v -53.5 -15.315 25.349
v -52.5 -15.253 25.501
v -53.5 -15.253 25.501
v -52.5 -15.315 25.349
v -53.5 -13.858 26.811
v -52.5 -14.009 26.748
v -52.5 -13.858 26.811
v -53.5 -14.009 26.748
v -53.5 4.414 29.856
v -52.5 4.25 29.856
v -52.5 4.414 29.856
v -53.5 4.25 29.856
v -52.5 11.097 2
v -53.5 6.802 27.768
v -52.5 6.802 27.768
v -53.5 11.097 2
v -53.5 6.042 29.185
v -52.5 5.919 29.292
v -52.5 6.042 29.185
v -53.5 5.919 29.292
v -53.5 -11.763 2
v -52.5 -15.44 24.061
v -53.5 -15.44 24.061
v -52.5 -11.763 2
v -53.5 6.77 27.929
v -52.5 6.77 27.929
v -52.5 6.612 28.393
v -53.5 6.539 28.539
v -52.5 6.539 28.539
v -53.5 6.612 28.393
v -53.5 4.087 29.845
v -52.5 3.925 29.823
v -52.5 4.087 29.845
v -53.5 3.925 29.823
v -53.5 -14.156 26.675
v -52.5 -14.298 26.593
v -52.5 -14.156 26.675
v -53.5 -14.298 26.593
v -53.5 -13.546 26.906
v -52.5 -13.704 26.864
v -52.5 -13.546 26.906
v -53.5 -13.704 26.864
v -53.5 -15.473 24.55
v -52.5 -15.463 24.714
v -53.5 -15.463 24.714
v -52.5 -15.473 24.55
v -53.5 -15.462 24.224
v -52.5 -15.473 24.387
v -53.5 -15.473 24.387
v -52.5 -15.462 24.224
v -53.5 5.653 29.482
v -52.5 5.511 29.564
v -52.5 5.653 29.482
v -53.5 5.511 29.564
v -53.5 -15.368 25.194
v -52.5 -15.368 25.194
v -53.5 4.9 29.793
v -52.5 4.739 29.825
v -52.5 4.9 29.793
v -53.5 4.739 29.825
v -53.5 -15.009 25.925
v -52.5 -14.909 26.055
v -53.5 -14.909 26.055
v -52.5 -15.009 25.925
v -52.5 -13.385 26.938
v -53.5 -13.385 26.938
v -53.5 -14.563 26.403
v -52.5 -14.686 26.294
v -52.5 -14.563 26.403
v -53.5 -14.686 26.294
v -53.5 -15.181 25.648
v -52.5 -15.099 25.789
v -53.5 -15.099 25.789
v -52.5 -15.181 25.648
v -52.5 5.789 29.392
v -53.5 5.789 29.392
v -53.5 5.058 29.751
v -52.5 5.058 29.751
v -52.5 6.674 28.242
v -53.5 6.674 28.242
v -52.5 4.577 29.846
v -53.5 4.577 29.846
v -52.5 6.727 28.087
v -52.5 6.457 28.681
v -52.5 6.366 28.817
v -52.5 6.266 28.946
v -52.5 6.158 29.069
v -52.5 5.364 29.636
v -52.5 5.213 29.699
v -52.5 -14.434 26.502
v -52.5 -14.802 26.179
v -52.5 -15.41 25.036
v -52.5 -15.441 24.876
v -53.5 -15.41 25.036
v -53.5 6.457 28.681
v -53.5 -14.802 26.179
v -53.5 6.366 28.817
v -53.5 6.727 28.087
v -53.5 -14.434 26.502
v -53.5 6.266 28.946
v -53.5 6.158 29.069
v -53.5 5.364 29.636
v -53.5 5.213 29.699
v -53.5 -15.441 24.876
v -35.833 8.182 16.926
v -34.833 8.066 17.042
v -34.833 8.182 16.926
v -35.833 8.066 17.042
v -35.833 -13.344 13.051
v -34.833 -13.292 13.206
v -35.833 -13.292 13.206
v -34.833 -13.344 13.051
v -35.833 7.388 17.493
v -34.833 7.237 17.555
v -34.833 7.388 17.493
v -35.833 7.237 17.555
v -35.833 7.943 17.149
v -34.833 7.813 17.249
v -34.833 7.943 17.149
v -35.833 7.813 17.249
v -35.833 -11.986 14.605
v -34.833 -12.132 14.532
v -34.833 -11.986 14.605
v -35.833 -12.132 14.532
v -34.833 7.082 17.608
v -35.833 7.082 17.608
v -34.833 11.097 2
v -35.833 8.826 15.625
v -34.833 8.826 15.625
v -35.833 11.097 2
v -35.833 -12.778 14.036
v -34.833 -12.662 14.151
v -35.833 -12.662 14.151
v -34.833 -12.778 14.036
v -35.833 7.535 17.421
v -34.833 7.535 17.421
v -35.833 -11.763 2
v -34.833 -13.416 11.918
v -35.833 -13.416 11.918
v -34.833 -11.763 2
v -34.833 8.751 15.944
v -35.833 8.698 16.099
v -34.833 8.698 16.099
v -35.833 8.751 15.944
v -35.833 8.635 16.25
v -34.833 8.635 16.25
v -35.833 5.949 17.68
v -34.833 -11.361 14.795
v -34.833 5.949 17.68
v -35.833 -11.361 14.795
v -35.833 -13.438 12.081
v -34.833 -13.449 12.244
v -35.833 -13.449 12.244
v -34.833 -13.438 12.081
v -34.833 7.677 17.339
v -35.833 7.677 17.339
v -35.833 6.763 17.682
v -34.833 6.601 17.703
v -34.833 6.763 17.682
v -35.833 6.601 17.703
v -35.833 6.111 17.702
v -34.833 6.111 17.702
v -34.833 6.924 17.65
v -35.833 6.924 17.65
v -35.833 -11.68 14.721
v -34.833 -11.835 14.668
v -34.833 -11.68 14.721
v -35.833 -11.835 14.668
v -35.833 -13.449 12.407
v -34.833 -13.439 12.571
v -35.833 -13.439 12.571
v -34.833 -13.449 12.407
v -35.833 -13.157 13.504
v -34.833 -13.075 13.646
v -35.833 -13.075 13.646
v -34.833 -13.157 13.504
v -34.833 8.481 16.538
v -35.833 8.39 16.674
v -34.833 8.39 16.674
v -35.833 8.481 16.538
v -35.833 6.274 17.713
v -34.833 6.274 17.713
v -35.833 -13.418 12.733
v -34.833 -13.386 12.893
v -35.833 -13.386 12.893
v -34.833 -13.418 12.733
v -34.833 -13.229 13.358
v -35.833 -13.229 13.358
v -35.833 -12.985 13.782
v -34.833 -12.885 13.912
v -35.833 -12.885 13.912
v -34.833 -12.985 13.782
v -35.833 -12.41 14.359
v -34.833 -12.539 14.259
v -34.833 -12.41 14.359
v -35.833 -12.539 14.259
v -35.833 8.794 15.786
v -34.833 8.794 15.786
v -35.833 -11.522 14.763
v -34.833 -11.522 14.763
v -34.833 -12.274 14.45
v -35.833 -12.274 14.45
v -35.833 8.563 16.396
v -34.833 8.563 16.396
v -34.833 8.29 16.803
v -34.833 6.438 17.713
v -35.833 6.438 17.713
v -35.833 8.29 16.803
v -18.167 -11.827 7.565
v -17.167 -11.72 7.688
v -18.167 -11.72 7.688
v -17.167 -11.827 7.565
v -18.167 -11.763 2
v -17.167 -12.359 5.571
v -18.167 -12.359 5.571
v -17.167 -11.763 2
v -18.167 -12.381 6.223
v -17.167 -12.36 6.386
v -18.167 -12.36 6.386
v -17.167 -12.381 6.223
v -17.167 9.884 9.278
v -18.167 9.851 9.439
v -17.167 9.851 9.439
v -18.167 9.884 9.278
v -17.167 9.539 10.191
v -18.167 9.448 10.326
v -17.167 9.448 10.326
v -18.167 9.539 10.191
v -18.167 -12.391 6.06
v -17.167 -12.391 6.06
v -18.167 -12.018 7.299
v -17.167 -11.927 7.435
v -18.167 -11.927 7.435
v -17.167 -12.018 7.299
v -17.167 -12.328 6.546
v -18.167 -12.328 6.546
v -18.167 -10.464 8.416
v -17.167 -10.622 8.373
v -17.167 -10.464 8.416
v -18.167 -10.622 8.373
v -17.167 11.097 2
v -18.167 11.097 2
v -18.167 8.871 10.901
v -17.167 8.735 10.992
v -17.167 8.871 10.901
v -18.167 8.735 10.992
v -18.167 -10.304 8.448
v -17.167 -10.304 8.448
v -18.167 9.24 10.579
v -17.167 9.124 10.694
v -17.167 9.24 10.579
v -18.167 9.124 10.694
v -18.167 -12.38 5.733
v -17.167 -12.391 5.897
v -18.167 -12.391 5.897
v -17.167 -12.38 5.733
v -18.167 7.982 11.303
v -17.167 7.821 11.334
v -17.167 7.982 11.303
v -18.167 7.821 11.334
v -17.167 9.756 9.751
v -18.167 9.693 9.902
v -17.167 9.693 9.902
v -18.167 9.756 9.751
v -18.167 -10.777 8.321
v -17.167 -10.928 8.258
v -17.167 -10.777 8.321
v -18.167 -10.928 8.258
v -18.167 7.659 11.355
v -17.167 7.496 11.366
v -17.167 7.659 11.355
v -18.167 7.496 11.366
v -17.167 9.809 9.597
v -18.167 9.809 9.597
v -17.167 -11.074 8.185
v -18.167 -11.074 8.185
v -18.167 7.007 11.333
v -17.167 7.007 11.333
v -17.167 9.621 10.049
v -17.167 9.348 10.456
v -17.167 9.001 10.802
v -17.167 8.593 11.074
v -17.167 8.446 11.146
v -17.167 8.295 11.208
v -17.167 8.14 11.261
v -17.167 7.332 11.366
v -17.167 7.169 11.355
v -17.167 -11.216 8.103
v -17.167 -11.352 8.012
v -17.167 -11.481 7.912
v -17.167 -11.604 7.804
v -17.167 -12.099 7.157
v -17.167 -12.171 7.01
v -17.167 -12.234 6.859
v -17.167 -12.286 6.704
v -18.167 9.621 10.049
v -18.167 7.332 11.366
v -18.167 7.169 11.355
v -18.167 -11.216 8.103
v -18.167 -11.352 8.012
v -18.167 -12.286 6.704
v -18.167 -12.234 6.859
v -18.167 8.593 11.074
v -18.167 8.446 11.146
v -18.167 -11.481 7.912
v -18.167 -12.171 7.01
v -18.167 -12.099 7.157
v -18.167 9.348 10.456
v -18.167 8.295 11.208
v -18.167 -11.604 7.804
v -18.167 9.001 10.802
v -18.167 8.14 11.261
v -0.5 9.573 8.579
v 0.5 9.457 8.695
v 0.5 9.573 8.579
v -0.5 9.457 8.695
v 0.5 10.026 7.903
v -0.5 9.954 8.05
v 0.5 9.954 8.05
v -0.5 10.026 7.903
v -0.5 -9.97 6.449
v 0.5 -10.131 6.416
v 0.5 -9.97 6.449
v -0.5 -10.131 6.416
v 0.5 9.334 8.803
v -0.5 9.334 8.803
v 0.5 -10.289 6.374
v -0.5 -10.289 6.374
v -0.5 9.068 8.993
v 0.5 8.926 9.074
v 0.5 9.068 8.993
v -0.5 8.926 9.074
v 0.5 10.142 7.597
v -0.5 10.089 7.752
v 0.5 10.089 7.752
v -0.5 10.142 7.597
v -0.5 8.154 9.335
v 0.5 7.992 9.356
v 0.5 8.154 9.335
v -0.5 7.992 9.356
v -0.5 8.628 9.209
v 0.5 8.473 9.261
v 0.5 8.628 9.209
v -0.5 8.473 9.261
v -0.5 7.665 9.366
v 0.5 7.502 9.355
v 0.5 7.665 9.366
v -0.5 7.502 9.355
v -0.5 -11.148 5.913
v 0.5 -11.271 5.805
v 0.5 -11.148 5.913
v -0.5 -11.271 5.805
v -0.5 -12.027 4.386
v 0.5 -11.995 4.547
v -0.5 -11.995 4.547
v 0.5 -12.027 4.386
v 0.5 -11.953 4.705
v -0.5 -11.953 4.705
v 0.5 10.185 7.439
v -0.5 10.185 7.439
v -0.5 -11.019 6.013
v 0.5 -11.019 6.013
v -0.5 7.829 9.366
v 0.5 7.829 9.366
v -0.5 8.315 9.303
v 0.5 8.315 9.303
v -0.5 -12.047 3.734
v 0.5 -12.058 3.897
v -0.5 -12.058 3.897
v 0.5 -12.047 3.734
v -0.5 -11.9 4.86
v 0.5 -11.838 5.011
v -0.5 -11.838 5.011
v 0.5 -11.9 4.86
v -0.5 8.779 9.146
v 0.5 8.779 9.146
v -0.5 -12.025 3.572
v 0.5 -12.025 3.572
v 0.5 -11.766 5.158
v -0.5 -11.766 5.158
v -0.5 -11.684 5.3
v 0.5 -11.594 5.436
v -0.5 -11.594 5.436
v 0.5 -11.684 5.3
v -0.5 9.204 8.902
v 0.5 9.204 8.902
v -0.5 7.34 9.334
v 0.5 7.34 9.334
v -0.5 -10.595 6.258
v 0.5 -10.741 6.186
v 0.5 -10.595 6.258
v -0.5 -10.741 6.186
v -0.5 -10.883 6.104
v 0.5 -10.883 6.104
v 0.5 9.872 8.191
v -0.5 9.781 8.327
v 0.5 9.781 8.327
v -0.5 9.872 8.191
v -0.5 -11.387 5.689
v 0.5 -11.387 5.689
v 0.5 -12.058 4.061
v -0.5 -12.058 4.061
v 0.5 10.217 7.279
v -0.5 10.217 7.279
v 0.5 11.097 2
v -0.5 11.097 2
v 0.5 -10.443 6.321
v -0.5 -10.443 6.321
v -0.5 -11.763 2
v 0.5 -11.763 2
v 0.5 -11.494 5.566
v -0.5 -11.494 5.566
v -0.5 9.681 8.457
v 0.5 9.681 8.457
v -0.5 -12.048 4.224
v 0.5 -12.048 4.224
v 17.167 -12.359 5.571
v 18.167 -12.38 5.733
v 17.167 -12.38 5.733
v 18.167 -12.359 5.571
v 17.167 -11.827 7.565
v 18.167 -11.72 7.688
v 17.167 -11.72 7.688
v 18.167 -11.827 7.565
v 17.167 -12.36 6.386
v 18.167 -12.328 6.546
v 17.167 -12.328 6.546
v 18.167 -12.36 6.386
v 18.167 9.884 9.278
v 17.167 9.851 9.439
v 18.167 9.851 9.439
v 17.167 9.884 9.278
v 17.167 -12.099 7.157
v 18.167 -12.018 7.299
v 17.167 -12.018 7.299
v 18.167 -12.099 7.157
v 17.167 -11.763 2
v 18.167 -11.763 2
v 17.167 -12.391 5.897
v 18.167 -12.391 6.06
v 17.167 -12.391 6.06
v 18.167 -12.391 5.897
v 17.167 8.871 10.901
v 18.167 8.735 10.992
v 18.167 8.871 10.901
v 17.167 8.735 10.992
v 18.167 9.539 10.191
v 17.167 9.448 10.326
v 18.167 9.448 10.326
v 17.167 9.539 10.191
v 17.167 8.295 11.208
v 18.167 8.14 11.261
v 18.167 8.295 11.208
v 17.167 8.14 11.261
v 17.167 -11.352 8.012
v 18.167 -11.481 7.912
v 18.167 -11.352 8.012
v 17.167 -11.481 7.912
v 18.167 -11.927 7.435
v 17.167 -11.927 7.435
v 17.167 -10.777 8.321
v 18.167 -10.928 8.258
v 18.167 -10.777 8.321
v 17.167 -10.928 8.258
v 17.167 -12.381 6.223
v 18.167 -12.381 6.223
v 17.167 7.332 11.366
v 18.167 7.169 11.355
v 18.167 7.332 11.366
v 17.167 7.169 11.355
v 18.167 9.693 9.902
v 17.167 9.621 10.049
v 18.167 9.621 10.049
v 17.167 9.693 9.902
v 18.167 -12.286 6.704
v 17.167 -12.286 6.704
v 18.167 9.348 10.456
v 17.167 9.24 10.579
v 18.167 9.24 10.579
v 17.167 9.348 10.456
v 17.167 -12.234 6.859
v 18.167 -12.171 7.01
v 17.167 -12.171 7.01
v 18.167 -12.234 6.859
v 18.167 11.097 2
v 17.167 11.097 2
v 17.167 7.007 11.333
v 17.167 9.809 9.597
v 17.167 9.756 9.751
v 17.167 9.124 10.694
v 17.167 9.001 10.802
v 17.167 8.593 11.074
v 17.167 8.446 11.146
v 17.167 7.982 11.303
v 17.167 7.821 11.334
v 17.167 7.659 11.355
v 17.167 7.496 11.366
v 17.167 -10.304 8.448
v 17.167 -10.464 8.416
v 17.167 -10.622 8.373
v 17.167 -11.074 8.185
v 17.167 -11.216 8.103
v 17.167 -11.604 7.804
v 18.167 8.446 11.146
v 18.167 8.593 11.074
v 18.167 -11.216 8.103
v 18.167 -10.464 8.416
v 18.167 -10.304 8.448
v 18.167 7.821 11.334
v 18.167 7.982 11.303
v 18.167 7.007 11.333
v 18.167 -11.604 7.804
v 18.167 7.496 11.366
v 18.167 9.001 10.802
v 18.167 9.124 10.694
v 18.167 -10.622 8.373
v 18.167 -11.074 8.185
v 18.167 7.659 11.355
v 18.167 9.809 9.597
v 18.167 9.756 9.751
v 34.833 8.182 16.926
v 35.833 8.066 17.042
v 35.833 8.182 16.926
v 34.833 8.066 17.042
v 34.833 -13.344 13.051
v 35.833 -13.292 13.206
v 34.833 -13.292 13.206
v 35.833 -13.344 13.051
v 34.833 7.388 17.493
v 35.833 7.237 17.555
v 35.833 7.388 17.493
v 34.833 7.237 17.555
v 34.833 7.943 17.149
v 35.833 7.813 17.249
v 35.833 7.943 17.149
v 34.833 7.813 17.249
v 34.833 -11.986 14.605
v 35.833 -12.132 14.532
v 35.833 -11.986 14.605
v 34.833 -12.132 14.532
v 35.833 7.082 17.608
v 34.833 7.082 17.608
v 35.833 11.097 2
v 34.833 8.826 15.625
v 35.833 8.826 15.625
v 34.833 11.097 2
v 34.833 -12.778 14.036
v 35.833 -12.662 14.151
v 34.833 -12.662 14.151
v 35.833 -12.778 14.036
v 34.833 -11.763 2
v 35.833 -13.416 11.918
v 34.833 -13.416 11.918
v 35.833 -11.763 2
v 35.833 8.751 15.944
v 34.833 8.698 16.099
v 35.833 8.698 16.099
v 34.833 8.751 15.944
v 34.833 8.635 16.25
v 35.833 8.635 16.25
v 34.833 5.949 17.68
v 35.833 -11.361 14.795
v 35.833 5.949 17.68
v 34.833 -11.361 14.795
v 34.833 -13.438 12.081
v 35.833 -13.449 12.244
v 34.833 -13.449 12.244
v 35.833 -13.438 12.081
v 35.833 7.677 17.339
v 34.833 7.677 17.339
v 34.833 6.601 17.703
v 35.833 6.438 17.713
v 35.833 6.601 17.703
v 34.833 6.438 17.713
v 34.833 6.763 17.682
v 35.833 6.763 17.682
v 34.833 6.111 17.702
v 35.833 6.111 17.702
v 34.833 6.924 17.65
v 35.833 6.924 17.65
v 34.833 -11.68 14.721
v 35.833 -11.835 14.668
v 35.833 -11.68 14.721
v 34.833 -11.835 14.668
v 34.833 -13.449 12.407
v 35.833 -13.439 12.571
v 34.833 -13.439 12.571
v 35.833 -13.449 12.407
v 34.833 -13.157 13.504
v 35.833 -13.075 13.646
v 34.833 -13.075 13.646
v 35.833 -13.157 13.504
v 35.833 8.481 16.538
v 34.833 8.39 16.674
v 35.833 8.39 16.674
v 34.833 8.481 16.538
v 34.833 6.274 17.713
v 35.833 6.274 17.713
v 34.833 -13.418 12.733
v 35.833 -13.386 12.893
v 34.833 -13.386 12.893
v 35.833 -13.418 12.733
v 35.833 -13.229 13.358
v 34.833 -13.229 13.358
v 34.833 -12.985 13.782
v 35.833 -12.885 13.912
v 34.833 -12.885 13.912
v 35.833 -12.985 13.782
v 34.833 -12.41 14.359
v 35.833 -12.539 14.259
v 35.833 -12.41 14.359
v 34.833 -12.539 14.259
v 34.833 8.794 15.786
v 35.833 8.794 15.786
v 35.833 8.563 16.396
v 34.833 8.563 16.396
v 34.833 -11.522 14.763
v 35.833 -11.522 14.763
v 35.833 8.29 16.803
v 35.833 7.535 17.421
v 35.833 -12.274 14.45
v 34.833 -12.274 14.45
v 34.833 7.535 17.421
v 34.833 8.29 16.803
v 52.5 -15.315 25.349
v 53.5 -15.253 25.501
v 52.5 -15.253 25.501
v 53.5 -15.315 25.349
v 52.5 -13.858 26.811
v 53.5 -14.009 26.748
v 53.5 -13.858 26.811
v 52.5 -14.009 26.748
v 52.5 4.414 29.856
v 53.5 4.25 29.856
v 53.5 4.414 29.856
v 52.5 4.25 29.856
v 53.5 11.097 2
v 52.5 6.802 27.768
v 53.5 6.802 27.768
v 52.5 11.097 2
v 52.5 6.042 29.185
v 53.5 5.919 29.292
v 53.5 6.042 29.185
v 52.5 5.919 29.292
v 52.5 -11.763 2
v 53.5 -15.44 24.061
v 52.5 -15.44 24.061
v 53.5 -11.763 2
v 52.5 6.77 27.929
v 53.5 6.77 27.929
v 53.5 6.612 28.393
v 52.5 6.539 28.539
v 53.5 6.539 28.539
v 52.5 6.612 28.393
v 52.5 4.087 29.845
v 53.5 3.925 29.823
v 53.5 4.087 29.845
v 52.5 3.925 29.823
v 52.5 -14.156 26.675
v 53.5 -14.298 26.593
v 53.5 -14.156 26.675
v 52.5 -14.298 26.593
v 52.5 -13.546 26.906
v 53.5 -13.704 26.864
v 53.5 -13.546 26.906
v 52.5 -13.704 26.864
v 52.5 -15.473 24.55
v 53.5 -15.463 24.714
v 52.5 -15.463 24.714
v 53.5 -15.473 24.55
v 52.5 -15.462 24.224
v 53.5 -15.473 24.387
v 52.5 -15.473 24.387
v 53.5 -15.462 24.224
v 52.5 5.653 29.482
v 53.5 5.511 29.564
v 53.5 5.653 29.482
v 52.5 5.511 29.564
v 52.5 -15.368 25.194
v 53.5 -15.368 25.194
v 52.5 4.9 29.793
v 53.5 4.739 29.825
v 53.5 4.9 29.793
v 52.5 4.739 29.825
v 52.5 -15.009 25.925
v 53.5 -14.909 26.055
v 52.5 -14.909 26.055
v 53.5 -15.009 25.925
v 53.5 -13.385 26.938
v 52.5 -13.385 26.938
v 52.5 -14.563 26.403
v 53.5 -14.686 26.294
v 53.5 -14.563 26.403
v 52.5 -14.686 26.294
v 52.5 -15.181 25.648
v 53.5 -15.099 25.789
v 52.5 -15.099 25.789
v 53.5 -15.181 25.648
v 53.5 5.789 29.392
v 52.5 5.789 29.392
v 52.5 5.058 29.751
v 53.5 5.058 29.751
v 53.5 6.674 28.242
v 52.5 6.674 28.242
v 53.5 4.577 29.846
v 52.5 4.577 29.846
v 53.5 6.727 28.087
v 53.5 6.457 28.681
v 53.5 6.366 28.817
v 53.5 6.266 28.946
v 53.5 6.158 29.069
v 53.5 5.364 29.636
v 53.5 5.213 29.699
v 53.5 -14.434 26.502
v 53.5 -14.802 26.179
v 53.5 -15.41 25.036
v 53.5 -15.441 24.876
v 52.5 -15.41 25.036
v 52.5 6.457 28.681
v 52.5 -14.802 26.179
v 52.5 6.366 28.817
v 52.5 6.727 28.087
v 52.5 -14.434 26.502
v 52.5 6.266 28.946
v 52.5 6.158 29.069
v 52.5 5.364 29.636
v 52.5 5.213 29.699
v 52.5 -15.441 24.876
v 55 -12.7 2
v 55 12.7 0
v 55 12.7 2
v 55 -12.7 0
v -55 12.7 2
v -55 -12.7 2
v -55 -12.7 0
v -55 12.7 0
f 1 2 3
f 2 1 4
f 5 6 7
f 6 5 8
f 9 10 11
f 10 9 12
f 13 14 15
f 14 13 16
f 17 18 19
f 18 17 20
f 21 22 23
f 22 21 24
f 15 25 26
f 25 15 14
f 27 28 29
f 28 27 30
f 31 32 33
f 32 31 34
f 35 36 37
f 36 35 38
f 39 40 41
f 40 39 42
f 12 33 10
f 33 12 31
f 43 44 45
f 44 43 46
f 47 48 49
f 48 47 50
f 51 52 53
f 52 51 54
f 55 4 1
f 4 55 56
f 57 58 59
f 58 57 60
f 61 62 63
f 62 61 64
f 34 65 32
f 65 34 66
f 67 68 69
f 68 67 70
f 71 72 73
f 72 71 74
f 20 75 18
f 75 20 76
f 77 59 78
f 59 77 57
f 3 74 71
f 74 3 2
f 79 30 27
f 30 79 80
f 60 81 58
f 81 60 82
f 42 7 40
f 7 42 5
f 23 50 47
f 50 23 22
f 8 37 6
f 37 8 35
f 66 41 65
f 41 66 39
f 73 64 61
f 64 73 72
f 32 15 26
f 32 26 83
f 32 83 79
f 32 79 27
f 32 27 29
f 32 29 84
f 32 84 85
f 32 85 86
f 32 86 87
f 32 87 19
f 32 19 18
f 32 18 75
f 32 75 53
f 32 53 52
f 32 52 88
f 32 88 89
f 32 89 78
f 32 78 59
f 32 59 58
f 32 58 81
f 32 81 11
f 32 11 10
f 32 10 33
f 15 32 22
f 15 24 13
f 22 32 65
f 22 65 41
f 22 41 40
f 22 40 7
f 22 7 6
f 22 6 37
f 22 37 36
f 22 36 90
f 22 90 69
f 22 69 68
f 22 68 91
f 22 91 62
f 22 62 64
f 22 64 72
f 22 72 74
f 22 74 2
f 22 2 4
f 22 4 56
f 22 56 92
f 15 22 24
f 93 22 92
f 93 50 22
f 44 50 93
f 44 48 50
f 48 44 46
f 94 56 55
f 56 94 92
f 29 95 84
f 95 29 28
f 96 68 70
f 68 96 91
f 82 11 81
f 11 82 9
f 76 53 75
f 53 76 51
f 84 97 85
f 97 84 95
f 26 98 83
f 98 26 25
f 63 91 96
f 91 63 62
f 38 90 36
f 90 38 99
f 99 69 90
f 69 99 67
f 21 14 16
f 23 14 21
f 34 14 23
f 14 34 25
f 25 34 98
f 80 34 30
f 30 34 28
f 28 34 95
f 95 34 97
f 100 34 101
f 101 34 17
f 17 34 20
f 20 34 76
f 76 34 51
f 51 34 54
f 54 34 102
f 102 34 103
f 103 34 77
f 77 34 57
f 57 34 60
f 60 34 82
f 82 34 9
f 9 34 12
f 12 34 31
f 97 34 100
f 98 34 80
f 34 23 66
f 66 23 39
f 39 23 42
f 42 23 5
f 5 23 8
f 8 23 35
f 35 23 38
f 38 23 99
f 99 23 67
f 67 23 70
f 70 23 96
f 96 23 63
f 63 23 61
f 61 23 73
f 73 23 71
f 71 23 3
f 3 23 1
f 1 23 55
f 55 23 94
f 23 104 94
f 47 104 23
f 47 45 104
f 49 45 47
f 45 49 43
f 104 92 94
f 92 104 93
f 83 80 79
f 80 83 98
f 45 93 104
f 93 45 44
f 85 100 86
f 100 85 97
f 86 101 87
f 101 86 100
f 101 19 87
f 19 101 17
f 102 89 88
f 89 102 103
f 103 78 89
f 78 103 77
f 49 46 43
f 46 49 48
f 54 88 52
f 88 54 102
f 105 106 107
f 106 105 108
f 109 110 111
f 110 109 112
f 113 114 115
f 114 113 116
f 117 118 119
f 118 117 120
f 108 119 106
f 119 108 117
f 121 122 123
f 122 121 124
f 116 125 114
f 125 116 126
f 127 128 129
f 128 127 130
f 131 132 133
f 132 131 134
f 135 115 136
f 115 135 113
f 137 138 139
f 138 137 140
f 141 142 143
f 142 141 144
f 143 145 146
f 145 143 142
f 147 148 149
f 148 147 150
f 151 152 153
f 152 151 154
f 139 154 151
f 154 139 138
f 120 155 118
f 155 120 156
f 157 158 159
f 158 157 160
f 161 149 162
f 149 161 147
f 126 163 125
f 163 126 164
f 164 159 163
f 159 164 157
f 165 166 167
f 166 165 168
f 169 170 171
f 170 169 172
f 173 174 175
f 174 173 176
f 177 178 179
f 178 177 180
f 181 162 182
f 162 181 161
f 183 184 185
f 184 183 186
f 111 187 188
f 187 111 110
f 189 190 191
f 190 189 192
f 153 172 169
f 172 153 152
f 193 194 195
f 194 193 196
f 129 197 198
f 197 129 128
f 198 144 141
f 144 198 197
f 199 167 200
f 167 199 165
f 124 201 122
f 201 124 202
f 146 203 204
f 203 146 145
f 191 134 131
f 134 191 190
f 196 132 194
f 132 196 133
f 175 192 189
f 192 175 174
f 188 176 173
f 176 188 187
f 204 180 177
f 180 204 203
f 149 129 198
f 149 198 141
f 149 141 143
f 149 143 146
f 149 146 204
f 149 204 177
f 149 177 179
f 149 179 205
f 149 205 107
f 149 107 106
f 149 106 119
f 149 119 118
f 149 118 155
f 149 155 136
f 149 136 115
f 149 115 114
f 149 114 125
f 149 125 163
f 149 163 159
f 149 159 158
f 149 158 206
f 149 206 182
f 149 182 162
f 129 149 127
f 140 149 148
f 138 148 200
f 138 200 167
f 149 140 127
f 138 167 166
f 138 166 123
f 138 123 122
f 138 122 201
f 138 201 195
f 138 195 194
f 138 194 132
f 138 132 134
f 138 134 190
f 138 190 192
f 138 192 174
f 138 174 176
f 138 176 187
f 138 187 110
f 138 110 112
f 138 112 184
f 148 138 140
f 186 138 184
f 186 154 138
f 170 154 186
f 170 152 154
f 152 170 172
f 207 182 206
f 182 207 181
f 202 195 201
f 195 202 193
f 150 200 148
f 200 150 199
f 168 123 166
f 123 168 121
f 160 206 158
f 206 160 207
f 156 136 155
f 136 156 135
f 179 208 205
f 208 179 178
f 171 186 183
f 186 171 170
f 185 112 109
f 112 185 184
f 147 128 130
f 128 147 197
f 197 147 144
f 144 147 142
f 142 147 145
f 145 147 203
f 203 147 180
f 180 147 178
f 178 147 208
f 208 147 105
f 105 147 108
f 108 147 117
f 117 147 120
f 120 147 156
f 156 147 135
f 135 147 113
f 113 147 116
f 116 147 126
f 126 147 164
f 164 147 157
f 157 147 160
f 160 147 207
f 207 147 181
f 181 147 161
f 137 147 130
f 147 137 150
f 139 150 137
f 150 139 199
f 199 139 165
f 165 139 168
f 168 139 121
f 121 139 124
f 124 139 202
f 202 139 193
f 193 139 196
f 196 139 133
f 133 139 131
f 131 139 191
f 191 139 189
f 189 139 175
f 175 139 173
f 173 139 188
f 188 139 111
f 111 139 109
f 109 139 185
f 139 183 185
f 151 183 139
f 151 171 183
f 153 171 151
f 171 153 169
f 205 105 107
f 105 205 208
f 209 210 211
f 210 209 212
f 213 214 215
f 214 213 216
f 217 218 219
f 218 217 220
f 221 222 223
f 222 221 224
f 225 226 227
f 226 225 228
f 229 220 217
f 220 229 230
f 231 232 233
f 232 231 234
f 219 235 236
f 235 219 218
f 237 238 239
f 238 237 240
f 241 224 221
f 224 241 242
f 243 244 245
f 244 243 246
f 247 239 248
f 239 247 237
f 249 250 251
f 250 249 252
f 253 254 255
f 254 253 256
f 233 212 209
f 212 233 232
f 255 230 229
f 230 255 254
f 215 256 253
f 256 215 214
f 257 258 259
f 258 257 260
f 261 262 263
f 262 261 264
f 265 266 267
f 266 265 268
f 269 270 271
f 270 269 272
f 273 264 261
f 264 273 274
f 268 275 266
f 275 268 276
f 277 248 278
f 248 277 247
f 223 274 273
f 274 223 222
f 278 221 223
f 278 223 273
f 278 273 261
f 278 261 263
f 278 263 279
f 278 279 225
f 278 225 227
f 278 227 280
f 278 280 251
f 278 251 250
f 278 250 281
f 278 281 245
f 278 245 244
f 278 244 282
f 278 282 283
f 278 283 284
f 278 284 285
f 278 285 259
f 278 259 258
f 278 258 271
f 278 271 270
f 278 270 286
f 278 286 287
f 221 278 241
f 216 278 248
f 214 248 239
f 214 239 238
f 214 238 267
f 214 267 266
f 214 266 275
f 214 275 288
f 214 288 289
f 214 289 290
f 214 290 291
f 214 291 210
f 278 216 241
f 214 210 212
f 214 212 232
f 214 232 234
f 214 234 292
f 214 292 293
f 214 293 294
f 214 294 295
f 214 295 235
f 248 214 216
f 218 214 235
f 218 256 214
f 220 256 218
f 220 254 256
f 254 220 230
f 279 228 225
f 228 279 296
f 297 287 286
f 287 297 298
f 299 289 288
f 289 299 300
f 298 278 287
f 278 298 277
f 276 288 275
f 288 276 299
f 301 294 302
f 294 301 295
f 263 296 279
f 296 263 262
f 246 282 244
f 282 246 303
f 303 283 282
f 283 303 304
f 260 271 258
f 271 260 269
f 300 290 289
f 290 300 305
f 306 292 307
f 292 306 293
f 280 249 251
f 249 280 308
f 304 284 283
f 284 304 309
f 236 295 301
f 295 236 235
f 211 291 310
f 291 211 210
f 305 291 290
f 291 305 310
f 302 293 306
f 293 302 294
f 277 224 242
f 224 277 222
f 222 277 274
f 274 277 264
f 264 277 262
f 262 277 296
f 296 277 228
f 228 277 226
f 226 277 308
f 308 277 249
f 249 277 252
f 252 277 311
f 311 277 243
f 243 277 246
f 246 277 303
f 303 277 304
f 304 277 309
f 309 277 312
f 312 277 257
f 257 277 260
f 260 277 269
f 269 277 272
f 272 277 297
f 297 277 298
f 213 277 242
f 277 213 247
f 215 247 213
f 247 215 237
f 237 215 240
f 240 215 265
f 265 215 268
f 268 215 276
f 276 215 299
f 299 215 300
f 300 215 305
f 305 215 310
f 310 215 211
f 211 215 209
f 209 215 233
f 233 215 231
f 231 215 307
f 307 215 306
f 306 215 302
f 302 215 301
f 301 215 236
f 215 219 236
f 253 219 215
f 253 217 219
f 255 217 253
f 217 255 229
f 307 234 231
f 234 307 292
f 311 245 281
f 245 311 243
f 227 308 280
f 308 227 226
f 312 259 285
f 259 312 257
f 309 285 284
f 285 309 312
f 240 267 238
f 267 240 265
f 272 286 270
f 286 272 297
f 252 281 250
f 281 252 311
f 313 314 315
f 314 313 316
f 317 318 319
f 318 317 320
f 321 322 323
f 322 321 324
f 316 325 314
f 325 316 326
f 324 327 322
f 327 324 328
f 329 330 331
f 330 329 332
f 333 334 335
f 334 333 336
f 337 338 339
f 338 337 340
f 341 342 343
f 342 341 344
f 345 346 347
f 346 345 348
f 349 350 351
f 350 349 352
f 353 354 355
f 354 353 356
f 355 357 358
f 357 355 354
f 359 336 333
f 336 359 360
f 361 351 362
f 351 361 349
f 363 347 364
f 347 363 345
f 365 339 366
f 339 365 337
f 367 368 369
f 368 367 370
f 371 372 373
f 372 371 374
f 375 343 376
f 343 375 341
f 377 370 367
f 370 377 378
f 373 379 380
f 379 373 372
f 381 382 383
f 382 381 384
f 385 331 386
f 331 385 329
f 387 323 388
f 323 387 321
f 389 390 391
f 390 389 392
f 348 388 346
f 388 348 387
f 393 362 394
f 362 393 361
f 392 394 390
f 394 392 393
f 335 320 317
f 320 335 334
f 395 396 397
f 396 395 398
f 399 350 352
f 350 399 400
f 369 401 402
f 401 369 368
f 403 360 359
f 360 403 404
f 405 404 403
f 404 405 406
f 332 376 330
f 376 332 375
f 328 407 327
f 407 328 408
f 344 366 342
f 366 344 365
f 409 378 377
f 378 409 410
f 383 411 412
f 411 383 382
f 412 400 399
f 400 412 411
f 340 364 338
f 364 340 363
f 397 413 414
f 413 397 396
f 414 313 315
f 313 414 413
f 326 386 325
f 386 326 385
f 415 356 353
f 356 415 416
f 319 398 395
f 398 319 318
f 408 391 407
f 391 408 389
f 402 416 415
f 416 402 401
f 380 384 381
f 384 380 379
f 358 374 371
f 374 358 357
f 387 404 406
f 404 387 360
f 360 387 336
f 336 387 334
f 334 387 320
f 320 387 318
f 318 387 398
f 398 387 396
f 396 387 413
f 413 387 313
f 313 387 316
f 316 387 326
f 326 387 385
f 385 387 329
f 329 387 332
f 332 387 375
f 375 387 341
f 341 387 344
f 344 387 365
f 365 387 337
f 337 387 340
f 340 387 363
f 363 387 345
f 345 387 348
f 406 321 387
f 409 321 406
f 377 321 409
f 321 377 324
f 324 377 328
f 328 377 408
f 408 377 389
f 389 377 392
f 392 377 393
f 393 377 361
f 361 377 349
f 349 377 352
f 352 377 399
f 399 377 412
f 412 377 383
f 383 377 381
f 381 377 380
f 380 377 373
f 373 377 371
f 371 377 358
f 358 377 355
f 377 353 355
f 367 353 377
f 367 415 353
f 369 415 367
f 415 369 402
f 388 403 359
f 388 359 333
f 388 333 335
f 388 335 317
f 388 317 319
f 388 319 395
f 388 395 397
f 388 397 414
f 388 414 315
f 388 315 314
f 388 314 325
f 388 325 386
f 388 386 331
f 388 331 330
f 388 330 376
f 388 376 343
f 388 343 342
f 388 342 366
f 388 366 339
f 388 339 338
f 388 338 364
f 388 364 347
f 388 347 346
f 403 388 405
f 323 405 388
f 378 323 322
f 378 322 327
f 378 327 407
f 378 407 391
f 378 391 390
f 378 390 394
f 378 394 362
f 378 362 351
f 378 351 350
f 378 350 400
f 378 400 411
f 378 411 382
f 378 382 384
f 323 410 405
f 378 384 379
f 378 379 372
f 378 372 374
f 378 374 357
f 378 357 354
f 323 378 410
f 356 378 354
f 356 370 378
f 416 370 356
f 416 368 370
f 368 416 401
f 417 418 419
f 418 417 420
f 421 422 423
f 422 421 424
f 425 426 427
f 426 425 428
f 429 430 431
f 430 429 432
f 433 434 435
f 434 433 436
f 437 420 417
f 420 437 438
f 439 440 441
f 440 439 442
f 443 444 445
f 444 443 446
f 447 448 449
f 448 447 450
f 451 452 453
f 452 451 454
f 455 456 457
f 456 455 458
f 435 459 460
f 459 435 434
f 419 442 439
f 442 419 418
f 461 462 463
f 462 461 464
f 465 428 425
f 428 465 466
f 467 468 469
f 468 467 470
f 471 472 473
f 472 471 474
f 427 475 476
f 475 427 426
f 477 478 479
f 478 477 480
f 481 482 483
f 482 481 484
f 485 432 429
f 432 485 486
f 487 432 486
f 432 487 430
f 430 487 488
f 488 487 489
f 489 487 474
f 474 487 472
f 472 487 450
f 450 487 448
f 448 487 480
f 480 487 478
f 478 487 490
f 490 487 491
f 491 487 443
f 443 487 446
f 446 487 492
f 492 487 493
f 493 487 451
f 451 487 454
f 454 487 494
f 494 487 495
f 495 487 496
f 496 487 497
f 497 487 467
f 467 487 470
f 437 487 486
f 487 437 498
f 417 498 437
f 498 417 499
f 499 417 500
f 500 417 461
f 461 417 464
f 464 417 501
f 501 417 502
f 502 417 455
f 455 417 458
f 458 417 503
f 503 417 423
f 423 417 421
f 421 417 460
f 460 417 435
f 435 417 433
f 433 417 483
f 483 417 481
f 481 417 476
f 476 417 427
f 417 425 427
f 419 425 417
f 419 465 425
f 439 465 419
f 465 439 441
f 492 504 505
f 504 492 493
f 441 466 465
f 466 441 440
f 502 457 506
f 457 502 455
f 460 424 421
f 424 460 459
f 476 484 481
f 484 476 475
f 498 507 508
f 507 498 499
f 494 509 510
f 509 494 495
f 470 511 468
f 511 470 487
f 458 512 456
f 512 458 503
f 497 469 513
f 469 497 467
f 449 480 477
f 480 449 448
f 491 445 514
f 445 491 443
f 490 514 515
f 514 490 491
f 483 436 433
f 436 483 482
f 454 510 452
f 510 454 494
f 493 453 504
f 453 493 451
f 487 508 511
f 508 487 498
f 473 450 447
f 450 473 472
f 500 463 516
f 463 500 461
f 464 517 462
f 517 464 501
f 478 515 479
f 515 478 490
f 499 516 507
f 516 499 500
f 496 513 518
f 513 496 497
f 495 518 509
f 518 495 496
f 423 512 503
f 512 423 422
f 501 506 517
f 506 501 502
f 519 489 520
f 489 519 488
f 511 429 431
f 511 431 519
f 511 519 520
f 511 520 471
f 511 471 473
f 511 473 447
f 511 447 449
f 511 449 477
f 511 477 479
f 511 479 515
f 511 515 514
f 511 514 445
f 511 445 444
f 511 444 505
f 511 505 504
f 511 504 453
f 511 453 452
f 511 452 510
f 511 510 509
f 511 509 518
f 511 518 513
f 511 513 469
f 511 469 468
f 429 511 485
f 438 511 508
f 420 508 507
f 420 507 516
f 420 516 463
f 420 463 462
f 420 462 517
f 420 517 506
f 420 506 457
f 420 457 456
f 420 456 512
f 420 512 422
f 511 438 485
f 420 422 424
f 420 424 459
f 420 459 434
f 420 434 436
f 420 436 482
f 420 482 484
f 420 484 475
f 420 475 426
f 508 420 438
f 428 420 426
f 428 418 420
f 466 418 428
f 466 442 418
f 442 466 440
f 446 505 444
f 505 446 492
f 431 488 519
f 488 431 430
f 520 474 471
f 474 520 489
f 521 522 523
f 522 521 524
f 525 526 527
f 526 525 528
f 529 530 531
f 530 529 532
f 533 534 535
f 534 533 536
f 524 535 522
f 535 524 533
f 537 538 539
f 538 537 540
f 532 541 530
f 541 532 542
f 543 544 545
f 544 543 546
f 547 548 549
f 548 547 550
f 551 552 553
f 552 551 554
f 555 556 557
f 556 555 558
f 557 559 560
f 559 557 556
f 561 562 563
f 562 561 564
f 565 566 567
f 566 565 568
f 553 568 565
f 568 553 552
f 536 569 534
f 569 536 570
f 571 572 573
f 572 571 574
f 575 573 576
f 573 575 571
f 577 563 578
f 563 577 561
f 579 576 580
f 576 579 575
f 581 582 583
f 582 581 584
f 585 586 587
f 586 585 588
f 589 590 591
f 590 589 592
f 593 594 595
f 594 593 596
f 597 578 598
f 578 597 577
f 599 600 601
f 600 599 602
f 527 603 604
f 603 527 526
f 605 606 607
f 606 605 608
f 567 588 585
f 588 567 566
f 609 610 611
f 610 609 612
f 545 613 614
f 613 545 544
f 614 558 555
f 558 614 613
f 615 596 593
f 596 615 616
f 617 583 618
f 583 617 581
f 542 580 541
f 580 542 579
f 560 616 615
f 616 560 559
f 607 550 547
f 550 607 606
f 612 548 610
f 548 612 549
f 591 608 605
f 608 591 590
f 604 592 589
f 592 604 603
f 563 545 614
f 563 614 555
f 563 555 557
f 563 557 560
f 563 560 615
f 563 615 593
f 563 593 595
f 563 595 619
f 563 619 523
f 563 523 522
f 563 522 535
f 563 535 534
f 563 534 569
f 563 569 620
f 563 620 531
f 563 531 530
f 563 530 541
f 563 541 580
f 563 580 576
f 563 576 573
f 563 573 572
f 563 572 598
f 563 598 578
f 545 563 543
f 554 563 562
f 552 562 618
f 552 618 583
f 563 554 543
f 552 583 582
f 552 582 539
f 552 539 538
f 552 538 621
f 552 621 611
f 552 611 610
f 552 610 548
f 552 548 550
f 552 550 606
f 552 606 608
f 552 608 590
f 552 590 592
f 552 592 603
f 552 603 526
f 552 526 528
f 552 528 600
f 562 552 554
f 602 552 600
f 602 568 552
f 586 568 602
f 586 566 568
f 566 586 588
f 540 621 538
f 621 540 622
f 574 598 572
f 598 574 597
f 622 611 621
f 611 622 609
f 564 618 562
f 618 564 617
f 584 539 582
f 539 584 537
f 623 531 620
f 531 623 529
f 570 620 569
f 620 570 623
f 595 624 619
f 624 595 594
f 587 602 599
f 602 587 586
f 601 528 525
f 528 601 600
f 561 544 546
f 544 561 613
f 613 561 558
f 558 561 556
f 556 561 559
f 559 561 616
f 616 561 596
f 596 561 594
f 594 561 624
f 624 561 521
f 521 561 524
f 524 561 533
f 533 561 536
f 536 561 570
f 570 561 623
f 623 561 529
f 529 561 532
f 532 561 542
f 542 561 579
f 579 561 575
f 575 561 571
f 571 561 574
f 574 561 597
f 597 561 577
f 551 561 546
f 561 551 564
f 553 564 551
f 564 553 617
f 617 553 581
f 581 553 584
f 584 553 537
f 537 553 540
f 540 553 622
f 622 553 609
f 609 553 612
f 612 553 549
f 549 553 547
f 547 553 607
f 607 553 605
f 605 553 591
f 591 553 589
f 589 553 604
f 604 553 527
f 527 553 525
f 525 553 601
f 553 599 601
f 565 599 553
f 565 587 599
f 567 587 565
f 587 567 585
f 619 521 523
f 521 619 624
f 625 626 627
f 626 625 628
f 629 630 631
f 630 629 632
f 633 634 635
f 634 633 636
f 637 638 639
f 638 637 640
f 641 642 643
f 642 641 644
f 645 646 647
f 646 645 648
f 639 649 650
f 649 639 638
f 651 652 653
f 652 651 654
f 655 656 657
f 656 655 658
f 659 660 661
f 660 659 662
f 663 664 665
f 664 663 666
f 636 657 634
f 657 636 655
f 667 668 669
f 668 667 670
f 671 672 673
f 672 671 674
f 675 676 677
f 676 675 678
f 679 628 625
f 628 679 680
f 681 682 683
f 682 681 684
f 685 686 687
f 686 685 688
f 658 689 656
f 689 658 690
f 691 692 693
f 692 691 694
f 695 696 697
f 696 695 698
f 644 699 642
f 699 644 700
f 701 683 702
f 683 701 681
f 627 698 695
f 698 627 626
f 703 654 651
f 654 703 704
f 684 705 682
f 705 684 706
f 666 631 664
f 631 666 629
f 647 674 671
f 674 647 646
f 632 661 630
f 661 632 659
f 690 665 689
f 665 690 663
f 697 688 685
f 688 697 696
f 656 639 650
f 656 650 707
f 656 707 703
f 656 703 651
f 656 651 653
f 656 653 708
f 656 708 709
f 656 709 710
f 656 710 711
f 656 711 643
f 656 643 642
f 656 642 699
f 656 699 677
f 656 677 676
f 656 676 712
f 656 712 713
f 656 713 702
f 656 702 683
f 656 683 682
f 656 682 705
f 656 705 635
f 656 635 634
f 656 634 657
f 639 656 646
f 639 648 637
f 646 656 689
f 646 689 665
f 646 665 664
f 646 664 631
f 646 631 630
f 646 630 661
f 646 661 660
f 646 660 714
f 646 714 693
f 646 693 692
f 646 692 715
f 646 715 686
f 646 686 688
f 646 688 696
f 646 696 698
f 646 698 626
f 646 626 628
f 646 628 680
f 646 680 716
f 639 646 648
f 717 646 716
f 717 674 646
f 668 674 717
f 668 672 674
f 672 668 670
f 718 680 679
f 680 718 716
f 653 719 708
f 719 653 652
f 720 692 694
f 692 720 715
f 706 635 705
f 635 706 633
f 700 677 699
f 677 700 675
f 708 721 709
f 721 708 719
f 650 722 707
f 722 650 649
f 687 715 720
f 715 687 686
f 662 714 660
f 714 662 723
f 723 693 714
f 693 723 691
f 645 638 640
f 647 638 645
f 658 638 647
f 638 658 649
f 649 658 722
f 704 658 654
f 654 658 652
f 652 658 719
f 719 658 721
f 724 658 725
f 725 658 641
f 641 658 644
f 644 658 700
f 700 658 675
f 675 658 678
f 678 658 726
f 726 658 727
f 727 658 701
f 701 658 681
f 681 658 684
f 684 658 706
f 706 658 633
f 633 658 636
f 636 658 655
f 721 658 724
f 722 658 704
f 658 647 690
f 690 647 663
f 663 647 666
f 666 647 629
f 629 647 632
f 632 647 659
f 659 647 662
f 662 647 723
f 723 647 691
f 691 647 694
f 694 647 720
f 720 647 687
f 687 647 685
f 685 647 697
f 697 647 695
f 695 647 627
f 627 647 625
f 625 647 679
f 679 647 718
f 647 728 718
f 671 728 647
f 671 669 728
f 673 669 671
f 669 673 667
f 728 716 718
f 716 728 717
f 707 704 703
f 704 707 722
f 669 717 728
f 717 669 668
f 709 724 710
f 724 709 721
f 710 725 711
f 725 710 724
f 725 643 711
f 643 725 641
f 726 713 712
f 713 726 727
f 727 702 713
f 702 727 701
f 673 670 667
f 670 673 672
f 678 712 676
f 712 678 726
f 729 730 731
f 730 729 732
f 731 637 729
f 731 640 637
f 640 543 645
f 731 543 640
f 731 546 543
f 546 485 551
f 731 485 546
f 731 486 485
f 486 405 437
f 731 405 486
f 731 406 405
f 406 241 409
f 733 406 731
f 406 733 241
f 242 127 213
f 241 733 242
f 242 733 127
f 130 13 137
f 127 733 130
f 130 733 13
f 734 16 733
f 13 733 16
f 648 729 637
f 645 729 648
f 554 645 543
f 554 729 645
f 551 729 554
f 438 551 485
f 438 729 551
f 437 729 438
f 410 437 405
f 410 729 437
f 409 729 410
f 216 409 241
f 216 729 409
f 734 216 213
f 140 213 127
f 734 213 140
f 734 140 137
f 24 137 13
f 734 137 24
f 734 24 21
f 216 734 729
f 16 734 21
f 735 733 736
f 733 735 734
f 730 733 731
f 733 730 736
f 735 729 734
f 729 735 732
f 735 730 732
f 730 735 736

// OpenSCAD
$fn=96;
epsilon=0.01;
above_eyes=50;
working_distance=300;
angle=atan(above_eyes/working_distance);

module bracket(hole_x=12.7, hole_y=5.5,thick=1.5) {
    difference() {
	union() {
	    hull() {
		rotate([0,0,angle]) cube([25.4,11,thick]);
		cube([25.4,0.1,thick]);
	    }
	    rotate([90,0,0]) cube([25.4,3+thick,thick]);
	}
	translate([hole_x,hole_y,-1]) cylinder(r=3/2,h=5);
    }
}

module bracket2(hole_x=12.7, hole_y=5.5,thick=1.5,wider=2) {
    difference() {
	translate([0,3,0]) rotate([0,0,-angle]) difference() {
	    union() {
		hull() {
		    rotate([0,0,angle]) translate([wider,-3,0]) cube([25.4,11,thick]);
		    translate([0,11,0]) cube([25.4 + 2 * wider,3,thick]);
		    translate([3,35,0]) cylinder(r=3,h=thick);
		    translate([25.4 + 2*wider - 3,35,0]) cylinder(r=3,h=thick);
		}
		rotate([90,0,angle]) translate([wider,0,3]) cube([25.4,3+thick,thick]);
	    }
	    translate([wider,15,-0.1]) cube([25.4,2,5]);
	    translate([wider,23,-0.1]) cube([25.4,2,5]);
	    translate([wider,31,-0.1]) cube([25.4,2,5]);
	}

	translate([wider,0,0]) translate([hole_x,hole_y,-1]) cylinder(r=3/2,h=5);
    }
}
    
module fin(length=25.4, height=3, width=1.8) {
    translate([-width/2,-1, -epsilon]) cube([width,length+2,height]);
}
module heatsink(base=25.4,fin_height=3) {
    // ruler and squint measurement :)
    color("silver") translate([-145/2,-base/2,0]) union() {
	translate([0,0,0]) fin(base, fin_height);
	translate([25.4/3,0,0]) fin(base, fin_height);
	translate([25.4,0,0]) fin(base, fin_height);
	translate([34,0,0]) fin(base, fin_height);
	translate([42.5,0,0]) fin(base, fin_height);
	translate([42.5,0,0]) fin(base, fin_height);
	translate([51,0,0]) fin(base, fin_height);
	translate([59.2,0,0]) fin(base, fin_height);
	translate([68,0,0]) fin(base, fin_height);
	translate([84.5,0,0]) fin(base, fin_height);
	translate([93,0,0]) fin(base, fin_height);
	translate([101.5,0,0]) fin(base, fin_height);
	translate([110,0,0]) fin(base, fin_height);
	translate([126.8,0,0]) fin(base, fin_height);
	translate([135.2,0,0]) fin(base, fin_height);
	translate([144,0,0]) fin(base, fin_height);
	translate([-7,-base/2,-20+epsilon]) cube([160,2*base,20]);
    }
}

module foam_finold(base=25.4,r=2.5,h2=12,thick=1) {
    rotate([0,-90,0]) translate([2*r,0,0]) hull() {
	translate([0,base/2-r,0]) cylinder(r=r,h=thick);
	translate([0,-base/2+r,0]) cylinder(r=r,h=thick);
	translate([h2,-base/2+r,0]) cylinder(r=r,h=thick);
    }
}

module rounded_rectangle(base=25.4,r=2.5,h=12,thick=1) {
    rotate([0,-90,0]) translate([r,0,0]) hull() {
	translate([-10,base/2-r,-thick/2]) cylinder(r=r,h=thick);
	translate([0,-base/2+r,-thick/2]) cylinder(r=r,h=thick);
	translate([h,-base/2+r,-thick/2]) cylinder(r=r,h=thick);
	translate([h,base/2-r,-thick/2]) cylinder(r=r,h=thick);
    }
}

module forehead_holder(heatsink_base=25.4,length=64,angle=20,head_radius=120,fin_height=3,fin_count=10) {
    difference() {
	union() {
	    translate([-length/2,-heatsink_base/2,-fin_height]) cube([length,heatsink_base,fin_height+2]);
	    // x^2+y^2 = head_radius^2
	    // so: y = sqrt(head_radius^2 - x^2)
	    rotate([angle,0,0])
	      for (i=[-length/2 + 2:(length-4)/(fin_count-1):length/2 - 2]) {
		translate([i,0,0]) rounded_rectangle(h=head_radius+3-sqrt(head_radius*head_radius - i*i), base=0.9 * cos(angle)*heatsink_base);
	    }
	}
	translate([0,0,-fin_height]) heatsink(base=heatsink_base, fin_height=fin_height);
    }
}

module brackets() {
    // The holes are a bit off-center :)
    bracket2(hole_x=12.7,hole_y=5.7);
    translate([0,-16,0]) bracket(hole_x=11.8,hole_y=6);
}

module retainer(wider=2) {
    difference() {
	cube([25.4 + 2*wider, 4, 12], center=true);
	cube([25.4, 2, 14], center=true);
    }
}

module test_forehead() {
    difference() {
	forehead_holder(length=110, fin_count=7, head_radius=78, angle=angle);
	translate([0,0,-5]) cube([200,200,10], center=true);
    }
}

//heatsink();
//retainer();
//brackets();

//rounded_rectangle();
//heatsink();

//bracket2();
//translate([-30,0,0]) bracket();
test_forehead();
